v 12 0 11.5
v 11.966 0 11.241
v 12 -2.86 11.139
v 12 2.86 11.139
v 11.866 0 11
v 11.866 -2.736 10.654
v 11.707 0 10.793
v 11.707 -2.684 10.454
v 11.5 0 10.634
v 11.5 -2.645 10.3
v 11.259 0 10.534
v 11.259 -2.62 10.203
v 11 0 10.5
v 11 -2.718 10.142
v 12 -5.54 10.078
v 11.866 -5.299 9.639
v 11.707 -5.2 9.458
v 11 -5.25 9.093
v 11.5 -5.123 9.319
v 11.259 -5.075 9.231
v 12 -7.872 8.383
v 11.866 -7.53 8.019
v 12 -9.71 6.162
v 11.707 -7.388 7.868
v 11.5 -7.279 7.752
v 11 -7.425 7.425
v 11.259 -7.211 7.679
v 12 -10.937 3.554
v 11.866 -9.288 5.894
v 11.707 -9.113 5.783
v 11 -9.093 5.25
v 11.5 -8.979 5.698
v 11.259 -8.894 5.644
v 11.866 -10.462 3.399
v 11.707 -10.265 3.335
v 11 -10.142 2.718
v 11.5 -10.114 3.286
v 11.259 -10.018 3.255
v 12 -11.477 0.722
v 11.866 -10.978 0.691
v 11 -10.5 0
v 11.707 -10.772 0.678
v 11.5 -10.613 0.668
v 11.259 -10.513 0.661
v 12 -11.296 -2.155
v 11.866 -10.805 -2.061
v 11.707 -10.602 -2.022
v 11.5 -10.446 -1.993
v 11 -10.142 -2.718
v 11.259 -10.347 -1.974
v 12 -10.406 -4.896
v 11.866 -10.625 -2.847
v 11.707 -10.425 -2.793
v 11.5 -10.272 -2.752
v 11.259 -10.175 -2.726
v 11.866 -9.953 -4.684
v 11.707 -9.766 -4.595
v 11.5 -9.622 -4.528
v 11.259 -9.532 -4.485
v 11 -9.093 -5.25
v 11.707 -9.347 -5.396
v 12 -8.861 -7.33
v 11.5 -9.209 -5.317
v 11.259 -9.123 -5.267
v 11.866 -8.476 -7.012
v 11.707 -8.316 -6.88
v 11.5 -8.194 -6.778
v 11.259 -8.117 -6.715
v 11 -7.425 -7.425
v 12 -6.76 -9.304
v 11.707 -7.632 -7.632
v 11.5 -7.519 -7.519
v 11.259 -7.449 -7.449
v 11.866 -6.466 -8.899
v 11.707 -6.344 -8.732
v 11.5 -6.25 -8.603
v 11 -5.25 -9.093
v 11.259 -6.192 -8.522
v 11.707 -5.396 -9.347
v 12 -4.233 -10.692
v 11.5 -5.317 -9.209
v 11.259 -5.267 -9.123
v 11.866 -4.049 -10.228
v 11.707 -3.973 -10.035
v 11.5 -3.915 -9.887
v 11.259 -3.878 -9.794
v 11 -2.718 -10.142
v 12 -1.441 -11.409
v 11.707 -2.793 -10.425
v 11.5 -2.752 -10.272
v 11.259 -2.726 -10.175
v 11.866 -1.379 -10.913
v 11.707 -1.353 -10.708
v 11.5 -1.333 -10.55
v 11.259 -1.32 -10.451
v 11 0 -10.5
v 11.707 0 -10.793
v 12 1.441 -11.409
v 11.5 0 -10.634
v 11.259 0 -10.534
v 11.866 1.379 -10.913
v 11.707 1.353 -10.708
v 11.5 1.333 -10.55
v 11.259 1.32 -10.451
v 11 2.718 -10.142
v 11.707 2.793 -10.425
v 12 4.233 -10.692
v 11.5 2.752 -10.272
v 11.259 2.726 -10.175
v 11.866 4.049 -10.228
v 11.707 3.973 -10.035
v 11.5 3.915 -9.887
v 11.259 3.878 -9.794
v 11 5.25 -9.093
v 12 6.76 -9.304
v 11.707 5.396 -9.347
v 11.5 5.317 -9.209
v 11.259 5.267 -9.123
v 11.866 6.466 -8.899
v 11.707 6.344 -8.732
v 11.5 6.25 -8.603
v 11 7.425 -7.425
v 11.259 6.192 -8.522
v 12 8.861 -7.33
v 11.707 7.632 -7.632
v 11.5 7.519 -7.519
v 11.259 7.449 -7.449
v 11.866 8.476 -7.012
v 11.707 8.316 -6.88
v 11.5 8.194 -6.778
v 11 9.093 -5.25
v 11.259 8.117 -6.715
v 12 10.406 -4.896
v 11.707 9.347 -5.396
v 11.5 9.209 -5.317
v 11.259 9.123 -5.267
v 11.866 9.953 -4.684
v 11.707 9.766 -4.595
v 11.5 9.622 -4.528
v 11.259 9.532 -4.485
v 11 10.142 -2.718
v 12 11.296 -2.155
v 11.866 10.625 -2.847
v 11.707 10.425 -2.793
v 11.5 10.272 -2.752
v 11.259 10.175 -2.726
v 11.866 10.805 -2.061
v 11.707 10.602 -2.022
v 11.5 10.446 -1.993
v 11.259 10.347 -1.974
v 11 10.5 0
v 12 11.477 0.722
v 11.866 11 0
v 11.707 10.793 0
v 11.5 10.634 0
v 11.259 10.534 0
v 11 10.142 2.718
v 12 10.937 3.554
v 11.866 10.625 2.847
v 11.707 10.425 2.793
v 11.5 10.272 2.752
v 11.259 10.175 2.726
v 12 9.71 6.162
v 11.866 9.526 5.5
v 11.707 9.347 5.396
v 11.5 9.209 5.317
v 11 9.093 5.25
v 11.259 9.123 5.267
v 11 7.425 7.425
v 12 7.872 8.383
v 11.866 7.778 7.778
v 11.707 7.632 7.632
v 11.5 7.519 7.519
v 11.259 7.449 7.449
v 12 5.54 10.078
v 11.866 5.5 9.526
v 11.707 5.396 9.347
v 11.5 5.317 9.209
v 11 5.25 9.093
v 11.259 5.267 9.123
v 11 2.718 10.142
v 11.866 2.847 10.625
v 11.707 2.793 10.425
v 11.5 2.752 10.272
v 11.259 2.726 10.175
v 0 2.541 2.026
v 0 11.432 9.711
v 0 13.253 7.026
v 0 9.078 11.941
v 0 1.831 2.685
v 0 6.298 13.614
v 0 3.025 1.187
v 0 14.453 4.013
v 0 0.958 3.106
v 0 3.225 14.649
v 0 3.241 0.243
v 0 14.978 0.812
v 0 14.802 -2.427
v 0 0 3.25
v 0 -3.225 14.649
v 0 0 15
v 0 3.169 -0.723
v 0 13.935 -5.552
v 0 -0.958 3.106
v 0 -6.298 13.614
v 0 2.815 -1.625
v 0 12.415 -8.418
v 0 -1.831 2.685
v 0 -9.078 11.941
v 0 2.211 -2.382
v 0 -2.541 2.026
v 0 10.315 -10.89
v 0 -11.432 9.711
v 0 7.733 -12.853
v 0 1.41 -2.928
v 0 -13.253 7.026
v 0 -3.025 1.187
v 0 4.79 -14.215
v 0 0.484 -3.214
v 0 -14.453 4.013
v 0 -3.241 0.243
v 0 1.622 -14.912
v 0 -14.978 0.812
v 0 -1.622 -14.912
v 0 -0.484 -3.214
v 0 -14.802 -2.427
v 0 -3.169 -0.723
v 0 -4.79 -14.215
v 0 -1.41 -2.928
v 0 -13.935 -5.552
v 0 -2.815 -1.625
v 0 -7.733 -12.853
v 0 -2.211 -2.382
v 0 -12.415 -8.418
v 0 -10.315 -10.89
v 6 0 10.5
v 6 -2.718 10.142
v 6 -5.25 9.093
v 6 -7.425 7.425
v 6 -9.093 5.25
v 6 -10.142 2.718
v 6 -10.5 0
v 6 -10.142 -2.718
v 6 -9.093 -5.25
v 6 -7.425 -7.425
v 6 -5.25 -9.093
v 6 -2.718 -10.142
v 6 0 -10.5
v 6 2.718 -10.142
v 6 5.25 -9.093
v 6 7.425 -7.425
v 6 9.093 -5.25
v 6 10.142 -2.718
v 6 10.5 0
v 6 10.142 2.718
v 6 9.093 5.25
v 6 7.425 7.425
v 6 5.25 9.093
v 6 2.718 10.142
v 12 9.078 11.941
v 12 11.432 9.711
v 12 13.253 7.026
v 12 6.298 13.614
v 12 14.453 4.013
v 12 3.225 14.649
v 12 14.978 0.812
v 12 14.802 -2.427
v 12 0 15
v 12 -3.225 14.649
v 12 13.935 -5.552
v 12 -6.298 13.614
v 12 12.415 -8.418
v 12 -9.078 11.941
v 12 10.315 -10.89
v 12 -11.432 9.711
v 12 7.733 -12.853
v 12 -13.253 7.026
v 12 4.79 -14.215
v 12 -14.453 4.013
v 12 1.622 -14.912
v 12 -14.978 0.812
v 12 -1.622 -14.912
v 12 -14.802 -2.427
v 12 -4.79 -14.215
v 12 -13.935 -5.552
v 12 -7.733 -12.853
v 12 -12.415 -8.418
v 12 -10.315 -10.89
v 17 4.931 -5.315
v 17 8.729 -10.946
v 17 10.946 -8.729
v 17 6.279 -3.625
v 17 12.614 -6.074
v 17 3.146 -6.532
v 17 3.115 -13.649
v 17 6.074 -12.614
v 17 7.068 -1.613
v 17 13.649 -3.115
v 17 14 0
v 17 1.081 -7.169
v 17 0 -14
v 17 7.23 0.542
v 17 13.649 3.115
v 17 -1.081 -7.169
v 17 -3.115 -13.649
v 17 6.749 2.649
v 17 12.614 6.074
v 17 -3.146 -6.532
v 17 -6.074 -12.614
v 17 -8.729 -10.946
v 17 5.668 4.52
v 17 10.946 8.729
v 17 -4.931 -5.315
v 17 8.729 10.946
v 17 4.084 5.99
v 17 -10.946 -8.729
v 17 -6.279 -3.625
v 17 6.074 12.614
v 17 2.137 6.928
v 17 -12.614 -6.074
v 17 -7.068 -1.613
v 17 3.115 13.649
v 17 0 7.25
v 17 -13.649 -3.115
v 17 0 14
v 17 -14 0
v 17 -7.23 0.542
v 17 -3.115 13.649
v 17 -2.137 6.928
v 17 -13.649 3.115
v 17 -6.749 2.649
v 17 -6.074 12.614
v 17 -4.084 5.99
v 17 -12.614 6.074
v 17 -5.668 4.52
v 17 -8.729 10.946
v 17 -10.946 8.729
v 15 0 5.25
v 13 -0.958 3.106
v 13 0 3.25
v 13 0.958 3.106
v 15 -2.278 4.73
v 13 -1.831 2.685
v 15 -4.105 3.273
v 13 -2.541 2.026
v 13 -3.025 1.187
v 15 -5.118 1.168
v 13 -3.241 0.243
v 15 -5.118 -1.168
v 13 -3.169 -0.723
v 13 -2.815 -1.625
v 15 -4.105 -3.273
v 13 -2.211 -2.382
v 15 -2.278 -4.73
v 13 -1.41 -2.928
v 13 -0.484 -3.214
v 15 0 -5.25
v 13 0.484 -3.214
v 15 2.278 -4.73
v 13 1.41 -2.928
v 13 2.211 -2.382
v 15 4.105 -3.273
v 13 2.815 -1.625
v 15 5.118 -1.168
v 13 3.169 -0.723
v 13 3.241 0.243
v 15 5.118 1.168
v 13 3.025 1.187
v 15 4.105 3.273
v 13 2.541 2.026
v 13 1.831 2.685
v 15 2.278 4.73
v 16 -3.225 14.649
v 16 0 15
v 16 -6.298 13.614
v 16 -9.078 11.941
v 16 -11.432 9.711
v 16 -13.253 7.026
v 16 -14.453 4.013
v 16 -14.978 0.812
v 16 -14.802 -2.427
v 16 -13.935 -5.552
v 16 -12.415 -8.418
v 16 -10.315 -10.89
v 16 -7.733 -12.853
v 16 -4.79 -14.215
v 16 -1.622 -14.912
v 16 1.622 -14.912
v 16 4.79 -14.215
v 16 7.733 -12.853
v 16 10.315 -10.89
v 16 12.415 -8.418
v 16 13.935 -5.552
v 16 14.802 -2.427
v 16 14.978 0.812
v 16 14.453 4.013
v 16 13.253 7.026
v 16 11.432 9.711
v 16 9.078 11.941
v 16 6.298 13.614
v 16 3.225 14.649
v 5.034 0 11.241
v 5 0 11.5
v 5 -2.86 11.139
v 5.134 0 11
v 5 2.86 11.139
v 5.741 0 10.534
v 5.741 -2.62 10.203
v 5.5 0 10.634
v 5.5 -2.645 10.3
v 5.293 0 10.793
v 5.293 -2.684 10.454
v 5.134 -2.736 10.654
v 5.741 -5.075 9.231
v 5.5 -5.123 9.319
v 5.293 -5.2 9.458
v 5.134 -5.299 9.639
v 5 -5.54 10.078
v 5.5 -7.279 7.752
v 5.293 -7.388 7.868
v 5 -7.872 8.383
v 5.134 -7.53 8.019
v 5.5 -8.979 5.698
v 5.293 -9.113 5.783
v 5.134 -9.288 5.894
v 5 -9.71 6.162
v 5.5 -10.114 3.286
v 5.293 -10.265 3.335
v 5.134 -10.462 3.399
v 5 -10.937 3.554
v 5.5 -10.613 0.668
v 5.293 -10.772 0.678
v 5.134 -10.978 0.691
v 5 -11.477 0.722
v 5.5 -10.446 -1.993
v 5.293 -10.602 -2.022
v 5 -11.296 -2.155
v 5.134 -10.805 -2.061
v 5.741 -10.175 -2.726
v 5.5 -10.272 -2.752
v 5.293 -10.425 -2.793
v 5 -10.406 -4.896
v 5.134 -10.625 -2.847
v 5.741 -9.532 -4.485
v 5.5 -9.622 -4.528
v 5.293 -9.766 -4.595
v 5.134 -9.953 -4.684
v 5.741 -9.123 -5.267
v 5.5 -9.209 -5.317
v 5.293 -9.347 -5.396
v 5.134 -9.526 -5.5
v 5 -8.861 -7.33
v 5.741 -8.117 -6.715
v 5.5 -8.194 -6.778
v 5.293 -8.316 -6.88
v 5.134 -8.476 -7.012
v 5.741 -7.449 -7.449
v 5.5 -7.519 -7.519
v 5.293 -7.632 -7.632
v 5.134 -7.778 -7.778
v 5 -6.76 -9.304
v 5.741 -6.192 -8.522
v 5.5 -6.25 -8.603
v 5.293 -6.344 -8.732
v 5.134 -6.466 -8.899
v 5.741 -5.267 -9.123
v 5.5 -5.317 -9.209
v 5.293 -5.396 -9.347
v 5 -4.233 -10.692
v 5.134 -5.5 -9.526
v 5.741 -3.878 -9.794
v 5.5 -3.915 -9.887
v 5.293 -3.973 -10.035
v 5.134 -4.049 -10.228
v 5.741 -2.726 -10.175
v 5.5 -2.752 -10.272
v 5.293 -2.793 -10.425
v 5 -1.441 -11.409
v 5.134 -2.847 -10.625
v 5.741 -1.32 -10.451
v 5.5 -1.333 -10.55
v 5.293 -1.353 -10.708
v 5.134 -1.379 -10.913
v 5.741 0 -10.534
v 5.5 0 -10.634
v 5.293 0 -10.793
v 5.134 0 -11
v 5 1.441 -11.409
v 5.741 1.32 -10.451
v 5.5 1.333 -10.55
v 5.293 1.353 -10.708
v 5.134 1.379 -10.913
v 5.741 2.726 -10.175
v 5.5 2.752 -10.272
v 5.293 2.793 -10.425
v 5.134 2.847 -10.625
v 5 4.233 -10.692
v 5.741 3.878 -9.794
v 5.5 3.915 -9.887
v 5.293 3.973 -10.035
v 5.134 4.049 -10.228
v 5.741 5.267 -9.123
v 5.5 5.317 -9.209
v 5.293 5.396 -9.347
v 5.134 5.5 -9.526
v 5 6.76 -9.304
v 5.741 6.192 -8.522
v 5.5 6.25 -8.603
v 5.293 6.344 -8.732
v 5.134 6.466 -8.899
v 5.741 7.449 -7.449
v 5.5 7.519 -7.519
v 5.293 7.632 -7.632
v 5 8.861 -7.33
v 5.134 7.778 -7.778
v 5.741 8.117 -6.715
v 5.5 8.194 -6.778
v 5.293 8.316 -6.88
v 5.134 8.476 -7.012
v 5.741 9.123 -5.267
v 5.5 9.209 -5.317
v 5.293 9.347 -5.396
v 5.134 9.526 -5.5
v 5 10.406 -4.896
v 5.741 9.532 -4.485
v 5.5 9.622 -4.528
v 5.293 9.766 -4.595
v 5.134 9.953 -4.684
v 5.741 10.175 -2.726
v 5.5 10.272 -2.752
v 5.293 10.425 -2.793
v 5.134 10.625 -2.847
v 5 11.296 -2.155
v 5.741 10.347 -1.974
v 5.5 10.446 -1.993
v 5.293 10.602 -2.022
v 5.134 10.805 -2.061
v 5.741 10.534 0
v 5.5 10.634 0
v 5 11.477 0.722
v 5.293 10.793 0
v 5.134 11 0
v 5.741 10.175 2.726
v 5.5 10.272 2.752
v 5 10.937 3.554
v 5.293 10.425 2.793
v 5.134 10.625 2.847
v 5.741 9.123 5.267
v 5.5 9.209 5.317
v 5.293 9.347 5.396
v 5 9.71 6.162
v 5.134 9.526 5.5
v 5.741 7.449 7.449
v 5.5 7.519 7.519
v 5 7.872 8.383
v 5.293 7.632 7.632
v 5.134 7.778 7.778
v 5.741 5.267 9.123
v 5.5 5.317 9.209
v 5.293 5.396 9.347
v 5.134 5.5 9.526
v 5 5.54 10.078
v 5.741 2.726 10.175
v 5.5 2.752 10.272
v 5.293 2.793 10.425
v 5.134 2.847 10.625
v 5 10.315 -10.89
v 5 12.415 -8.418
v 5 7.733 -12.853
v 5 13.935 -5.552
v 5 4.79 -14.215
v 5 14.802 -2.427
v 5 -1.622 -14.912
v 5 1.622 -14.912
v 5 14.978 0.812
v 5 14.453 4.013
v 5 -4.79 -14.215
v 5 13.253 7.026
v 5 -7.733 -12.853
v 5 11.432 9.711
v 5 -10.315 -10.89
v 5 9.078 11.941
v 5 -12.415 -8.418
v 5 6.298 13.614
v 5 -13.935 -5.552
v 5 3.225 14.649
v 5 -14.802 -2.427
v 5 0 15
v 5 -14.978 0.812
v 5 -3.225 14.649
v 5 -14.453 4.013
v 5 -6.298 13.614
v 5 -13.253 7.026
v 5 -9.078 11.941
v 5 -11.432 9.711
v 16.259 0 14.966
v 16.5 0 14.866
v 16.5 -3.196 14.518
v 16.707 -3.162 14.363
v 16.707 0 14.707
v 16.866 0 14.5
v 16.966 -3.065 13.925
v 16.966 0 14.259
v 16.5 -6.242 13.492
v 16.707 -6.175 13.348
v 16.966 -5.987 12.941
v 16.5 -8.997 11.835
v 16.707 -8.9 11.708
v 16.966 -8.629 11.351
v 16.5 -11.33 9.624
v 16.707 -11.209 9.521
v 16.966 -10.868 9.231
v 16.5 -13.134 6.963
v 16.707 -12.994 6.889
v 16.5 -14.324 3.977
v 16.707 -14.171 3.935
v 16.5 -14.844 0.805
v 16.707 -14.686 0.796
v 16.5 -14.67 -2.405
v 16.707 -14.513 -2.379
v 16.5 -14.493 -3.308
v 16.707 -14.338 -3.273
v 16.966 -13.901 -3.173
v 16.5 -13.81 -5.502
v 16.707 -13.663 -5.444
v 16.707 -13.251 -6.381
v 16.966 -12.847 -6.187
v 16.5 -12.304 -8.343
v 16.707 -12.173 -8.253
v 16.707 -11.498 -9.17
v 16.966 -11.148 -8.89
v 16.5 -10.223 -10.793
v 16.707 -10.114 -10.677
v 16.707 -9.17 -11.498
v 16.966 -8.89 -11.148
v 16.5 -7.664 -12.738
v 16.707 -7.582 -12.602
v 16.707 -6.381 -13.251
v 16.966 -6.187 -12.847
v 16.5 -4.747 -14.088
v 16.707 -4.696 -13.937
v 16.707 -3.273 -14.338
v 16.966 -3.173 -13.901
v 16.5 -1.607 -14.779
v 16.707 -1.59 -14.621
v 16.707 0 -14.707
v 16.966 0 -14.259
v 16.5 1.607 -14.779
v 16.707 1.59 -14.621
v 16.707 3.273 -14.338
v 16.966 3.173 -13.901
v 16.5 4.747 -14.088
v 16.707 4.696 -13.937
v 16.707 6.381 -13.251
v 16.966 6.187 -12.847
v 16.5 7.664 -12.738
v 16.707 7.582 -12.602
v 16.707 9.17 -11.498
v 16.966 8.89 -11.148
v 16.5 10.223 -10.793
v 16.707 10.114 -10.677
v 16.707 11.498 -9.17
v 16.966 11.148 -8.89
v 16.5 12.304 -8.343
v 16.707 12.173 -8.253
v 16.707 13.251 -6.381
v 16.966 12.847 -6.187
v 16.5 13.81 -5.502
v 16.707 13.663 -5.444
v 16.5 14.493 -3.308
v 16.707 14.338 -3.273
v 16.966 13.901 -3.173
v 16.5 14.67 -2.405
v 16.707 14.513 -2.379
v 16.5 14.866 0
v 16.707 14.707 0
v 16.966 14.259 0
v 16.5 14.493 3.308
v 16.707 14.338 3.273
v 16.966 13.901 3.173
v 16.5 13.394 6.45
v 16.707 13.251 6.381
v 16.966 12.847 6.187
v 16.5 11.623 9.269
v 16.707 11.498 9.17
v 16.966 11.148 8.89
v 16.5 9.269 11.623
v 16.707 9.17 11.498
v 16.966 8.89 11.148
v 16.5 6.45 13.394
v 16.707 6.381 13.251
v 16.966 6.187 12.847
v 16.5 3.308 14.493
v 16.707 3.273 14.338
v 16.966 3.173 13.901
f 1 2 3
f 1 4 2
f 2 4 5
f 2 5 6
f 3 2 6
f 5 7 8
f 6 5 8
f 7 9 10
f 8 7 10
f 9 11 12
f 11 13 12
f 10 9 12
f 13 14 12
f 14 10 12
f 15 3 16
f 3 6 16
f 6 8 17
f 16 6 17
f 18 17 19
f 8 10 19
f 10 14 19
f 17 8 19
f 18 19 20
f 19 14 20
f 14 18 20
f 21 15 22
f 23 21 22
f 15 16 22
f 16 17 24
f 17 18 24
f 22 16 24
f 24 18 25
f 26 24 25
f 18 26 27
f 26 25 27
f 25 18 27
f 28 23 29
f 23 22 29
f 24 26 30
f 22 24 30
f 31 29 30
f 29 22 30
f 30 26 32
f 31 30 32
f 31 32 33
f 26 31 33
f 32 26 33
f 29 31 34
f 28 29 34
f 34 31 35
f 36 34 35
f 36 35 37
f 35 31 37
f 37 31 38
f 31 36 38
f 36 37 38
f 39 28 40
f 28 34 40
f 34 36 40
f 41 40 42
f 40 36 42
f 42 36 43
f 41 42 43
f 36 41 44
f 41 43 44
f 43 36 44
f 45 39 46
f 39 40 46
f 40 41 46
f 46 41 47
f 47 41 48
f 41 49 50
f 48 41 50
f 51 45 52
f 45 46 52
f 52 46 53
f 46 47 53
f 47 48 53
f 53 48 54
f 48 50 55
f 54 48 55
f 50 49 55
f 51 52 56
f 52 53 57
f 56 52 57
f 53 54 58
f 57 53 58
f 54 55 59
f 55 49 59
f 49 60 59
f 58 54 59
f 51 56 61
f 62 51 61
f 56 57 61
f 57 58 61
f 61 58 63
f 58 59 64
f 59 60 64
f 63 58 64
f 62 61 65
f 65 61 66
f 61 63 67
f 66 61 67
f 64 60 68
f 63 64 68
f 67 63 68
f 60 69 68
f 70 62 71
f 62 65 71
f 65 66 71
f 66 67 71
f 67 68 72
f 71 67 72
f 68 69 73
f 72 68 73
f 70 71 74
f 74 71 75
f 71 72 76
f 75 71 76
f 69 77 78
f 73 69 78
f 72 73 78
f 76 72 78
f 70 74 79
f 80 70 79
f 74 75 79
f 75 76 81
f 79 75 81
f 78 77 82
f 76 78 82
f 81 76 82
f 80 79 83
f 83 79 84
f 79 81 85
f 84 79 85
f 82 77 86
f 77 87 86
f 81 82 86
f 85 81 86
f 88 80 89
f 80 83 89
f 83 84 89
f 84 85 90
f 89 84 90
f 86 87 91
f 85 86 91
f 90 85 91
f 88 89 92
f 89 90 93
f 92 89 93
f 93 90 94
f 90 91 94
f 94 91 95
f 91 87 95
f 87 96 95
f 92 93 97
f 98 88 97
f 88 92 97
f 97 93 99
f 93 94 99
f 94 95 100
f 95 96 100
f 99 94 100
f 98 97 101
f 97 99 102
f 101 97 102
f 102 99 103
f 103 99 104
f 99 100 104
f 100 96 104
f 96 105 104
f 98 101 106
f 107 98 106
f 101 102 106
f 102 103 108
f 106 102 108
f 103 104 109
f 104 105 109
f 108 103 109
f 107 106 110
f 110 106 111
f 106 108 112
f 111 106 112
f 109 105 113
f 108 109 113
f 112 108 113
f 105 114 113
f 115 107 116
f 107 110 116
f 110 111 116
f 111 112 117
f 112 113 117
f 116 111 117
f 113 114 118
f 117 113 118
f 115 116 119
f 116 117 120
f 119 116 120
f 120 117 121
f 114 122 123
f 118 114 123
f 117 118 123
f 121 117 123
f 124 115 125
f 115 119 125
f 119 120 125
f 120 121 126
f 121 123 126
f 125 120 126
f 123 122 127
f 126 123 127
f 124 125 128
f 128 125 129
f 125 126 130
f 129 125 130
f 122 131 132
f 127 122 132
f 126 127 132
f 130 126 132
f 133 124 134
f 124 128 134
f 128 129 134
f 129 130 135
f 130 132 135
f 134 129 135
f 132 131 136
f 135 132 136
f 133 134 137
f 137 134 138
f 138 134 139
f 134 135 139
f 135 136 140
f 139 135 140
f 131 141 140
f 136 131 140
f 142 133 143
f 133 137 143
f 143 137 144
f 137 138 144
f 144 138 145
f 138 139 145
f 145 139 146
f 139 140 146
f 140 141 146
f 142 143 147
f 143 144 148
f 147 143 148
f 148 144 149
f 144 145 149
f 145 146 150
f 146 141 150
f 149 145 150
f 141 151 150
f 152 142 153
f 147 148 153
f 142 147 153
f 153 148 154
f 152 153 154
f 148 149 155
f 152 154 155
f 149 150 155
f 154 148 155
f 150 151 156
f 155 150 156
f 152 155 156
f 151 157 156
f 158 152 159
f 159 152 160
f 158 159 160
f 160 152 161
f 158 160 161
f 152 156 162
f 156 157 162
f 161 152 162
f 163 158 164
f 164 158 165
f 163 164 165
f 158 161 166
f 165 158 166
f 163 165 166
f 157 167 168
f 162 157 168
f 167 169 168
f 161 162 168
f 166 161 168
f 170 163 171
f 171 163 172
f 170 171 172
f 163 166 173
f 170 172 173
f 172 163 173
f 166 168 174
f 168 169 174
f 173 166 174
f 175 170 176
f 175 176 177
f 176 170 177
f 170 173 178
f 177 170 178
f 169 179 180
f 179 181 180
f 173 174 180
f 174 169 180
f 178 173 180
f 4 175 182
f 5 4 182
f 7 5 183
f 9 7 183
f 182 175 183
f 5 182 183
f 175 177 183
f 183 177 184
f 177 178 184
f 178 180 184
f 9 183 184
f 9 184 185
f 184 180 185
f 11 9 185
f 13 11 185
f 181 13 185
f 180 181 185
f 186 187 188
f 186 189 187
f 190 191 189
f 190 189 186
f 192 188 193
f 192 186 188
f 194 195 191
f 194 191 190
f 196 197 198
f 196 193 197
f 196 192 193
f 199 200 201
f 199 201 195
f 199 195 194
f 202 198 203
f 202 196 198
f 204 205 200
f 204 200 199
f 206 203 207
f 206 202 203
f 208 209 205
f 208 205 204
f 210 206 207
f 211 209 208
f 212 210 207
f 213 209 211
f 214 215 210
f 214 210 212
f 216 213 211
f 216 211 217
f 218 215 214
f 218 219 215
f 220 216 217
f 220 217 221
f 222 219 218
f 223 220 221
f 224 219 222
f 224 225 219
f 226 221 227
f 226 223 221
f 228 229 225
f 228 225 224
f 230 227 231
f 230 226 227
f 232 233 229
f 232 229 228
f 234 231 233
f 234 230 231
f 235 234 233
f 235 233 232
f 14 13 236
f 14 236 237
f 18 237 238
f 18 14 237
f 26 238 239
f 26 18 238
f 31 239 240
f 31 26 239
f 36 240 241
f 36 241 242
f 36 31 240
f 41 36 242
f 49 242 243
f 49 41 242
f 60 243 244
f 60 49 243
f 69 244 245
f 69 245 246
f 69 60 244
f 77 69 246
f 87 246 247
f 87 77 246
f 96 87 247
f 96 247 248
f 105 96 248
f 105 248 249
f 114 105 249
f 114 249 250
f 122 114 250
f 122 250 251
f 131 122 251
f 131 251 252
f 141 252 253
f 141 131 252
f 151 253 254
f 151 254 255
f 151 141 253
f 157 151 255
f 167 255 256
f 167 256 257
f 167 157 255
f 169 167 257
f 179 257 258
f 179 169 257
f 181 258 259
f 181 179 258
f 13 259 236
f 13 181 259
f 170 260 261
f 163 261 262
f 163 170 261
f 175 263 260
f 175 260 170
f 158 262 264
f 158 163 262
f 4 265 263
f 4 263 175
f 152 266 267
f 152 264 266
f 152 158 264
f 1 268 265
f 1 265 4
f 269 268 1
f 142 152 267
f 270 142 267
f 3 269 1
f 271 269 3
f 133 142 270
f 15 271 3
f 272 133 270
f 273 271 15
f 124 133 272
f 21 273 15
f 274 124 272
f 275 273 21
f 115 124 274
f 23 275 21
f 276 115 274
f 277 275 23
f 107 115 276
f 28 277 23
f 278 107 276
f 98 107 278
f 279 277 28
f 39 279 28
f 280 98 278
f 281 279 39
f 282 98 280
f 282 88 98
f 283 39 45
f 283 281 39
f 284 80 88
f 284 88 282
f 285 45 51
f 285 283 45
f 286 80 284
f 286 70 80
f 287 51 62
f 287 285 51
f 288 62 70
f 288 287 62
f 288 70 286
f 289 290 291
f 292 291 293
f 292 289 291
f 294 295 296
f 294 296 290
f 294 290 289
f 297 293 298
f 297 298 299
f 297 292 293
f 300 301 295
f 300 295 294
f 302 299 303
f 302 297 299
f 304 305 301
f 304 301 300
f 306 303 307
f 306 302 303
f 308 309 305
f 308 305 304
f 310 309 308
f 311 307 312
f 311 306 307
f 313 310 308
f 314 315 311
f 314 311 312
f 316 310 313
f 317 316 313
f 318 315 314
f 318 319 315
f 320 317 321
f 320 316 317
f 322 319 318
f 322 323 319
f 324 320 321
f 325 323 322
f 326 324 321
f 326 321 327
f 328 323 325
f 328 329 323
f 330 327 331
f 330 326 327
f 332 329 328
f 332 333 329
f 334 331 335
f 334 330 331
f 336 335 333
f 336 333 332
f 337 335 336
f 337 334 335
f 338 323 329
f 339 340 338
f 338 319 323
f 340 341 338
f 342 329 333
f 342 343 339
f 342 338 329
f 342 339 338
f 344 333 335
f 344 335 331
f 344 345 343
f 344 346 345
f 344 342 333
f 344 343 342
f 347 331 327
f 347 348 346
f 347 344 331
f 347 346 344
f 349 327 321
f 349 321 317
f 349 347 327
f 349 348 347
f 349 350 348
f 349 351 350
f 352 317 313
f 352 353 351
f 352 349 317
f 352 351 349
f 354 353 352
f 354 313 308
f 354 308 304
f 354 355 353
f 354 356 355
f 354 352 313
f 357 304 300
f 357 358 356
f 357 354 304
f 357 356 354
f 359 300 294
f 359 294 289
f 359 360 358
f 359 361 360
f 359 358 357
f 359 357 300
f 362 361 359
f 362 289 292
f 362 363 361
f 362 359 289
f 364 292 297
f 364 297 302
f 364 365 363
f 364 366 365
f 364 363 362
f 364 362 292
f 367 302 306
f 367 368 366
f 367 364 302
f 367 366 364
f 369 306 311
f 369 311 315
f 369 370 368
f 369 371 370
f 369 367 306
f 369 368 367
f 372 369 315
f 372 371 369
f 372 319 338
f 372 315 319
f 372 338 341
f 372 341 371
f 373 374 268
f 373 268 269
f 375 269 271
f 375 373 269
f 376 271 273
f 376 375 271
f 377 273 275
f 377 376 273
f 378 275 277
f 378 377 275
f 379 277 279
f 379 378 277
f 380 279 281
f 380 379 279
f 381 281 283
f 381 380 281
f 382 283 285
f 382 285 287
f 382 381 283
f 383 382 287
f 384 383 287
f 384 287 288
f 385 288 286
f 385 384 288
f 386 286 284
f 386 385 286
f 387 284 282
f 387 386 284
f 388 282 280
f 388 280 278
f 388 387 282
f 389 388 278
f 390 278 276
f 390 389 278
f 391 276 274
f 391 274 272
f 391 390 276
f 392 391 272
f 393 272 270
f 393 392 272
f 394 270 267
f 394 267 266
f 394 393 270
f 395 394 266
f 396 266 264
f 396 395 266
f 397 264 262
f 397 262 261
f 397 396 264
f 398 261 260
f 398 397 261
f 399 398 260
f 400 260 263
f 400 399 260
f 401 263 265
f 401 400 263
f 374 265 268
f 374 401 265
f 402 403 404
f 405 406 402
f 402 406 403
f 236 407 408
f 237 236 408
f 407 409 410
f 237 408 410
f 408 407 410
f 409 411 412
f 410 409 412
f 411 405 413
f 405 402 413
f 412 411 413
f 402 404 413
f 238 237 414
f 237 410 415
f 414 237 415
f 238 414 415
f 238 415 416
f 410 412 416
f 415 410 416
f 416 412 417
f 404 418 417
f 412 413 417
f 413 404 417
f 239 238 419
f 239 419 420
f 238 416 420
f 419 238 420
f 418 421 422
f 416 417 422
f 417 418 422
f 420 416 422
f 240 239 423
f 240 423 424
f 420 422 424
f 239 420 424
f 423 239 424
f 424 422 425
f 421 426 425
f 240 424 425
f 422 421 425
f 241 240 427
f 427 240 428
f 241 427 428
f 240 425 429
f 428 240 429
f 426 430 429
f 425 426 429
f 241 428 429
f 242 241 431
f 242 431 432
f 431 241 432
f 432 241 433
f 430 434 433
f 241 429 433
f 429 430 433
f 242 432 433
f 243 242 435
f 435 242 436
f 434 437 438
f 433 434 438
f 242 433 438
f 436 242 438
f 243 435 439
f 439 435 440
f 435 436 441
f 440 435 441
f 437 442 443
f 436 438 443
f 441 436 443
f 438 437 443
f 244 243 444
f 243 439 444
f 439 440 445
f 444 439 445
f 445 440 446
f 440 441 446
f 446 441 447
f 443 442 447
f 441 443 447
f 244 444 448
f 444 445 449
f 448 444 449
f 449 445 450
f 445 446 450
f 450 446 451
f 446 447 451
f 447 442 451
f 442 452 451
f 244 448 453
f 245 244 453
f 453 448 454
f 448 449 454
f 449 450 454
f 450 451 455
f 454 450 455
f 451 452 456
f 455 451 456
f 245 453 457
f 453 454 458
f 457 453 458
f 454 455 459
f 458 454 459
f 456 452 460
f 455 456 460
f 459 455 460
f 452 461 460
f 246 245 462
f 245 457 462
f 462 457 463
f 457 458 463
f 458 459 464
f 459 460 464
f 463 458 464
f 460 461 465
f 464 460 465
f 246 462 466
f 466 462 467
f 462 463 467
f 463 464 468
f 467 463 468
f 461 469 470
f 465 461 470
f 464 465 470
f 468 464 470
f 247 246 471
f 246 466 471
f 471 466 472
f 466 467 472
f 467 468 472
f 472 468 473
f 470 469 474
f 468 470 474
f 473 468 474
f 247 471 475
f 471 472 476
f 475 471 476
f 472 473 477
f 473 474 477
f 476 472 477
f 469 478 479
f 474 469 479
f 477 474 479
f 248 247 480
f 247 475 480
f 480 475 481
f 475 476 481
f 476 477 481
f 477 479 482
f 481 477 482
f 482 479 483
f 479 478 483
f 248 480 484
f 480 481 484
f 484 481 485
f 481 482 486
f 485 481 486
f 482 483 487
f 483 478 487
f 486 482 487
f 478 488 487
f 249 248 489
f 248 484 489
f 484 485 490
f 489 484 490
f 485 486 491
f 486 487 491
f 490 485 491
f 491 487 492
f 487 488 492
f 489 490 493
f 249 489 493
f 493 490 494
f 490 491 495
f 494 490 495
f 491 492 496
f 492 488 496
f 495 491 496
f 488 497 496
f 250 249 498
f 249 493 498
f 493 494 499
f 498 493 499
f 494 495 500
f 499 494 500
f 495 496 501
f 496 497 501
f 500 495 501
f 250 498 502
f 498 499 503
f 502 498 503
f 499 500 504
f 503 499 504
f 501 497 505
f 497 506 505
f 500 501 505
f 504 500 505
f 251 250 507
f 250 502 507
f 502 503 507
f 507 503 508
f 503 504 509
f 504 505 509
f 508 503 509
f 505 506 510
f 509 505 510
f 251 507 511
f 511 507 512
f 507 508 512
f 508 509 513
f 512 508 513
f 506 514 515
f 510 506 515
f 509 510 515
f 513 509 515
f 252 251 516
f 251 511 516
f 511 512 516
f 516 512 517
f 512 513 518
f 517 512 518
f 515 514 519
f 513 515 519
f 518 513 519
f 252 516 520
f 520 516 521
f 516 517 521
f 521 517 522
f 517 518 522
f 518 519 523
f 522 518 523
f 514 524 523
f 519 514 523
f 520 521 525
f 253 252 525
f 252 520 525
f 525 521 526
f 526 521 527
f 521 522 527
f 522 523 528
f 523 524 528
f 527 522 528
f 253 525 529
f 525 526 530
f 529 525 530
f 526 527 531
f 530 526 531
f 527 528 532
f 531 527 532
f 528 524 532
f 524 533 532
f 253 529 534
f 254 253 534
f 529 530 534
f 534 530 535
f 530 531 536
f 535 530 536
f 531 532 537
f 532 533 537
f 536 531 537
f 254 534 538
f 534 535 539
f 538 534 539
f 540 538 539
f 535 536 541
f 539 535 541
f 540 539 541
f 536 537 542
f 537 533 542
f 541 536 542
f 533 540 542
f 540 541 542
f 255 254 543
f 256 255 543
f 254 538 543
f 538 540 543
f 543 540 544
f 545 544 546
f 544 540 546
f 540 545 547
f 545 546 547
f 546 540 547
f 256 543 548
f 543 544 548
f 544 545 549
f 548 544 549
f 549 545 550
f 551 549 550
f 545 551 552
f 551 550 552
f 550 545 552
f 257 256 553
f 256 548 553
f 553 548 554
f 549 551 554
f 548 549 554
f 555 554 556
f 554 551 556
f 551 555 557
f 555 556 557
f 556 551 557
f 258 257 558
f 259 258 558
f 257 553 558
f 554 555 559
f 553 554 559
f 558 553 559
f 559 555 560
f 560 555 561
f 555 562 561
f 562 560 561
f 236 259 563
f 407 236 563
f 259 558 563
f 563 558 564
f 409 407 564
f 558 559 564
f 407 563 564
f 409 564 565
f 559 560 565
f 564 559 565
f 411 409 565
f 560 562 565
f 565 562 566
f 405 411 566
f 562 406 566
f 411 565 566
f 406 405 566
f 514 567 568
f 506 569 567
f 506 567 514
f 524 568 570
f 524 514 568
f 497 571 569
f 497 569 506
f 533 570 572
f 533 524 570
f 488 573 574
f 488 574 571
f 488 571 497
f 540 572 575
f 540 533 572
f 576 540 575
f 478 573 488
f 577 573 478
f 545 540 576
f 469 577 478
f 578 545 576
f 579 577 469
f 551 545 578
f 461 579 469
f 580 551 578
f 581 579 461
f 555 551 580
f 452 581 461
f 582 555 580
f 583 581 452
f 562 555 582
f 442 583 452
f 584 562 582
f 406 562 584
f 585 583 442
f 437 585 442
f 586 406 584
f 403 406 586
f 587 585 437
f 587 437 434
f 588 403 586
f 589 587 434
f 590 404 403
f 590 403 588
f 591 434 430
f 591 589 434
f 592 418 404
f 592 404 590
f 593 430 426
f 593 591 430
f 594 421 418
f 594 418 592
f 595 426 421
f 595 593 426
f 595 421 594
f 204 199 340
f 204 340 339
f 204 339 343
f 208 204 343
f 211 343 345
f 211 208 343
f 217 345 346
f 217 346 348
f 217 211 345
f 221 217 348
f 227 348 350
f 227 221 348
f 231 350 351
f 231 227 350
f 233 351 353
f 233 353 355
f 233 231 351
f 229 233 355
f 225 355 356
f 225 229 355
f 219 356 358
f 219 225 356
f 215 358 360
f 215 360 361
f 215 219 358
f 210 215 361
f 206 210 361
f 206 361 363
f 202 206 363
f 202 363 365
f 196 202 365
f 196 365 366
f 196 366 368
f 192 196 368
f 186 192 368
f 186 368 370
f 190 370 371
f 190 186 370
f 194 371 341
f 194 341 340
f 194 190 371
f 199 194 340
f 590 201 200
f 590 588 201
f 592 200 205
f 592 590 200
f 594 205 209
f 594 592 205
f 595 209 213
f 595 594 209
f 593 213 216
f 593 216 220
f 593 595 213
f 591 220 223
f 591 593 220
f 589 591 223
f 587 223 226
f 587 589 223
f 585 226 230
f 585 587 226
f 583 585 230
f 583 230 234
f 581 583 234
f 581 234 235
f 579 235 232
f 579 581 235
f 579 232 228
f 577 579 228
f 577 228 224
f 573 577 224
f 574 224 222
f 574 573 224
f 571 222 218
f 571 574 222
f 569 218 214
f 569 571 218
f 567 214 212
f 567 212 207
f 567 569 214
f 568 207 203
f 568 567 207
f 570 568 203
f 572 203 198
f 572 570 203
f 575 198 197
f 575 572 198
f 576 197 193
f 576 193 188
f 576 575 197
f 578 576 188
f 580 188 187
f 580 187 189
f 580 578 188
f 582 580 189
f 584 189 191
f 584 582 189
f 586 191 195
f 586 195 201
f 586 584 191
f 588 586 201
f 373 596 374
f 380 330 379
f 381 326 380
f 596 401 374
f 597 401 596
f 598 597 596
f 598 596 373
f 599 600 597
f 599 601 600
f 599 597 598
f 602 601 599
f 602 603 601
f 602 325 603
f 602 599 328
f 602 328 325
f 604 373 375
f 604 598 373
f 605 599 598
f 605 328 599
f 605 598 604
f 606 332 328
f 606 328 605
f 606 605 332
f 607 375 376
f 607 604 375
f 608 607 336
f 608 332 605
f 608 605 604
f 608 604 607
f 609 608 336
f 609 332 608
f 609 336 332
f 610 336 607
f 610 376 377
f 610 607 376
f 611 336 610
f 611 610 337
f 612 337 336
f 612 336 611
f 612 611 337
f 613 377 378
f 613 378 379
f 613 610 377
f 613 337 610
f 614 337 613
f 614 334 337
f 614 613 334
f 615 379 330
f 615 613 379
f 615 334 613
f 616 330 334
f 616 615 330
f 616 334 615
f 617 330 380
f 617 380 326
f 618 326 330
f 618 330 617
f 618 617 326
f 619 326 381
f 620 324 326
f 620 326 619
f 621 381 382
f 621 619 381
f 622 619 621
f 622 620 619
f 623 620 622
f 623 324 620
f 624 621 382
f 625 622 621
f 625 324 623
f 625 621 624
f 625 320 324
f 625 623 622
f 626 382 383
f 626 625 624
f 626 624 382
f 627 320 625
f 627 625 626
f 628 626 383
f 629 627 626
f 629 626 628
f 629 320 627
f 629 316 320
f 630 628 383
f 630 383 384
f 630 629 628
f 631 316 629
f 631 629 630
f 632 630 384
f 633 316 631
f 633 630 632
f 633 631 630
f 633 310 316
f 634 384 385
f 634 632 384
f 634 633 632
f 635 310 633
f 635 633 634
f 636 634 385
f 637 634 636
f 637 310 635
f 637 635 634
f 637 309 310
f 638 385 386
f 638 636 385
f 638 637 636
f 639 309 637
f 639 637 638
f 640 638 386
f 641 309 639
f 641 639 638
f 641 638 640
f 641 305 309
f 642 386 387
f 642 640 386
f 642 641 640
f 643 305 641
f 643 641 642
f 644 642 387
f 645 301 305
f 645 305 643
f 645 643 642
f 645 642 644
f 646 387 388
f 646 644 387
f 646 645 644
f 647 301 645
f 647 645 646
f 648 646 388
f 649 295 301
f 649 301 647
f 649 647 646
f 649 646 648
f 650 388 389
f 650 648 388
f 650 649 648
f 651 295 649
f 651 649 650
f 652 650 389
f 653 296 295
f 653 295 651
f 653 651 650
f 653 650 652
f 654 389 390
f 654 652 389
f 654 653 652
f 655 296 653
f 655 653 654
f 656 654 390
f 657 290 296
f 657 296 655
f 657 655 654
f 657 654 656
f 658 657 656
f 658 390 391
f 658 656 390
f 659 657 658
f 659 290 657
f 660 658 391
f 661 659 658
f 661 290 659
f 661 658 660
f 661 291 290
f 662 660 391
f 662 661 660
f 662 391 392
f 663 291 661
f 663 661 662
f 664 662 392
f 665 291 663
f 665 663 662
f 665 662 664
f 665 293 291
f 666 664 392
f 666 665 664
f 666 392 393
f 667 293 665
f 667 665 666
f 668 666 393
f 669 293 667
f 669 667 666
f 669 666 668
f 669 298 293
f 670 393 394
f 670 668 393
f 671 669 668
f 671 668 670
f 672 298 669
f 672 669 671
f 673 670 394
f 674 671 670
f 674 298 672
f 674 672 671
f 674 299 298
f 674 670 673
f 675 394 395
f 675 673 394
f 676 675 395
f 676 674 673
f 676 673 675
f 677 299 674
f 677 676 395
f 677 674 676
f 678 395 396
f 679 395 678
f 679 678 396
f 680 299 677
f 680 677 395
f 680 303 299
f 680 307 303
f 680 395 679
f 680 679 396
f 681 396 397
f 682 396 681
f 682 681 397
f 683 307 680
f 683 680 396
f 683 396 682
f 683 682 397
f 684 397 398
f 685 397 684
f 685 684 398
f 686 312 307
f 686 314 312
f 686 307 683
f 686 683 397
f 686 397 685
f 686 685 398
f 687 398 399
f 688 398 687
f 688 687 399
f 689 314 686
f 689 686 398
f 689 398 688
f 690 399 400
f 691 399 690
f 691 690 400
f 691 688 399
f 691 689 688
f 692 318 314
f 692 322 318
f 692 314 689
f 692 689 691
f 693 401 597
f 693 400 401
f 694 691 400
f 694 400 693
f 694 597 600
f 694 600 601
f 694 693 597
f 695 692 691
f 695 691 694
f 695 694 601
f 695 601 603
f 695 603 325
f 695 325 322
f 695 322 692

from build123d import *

# Parameters (mm, degrees)
FILLET1_R     = 1
FILLET2_R     = 1
CHAMFER1_SIZE = 4


with BuildPart() as part:
    # Sketch1 → Revolve1 (revolve)
    with BuildSketch(Plane.XY, mode=Mode.PRIVATE) as revolve1_sk:
        Polygon((12, 15), (17, 15), (17, 3.25), (0, 3.25), (0, 15), (5, 15), (5, 10.5), (12, 10.5), align=None)
    revolve(revolve1_sk.sketch.rotate(Axis((-8.121930128, 0, 0), (1, 0, 0)), 90), axis=Axis((-8.121930128, 0, 0), (1, 0, 0)))

    # Fillet1
    fillet1_edges = [part.edges().sort_by_distance(p)[0] for p in [
        (17, 0, -15),
    ]]
    fillet(fillet1_edges, radius=FILLET1_R)

    # Fillet2
    fillet2_edges = [part.edges().sort_by_distance(p)[0] for p in [
        (12, 0, -10.5),
        (5, 0, -10.5),
    ]]
    fillet(fillet2_edges, radius=FILLET2_R)

    # Chamfer1
    chamfer1_edges = [part.edges().sort_by_distance(p)[0] for p in [
        (17, 0, -3.25),
    ]]
    chamfer(chamfer1_edges, length=CHAMFER1_SIZE)


solid = part.part
